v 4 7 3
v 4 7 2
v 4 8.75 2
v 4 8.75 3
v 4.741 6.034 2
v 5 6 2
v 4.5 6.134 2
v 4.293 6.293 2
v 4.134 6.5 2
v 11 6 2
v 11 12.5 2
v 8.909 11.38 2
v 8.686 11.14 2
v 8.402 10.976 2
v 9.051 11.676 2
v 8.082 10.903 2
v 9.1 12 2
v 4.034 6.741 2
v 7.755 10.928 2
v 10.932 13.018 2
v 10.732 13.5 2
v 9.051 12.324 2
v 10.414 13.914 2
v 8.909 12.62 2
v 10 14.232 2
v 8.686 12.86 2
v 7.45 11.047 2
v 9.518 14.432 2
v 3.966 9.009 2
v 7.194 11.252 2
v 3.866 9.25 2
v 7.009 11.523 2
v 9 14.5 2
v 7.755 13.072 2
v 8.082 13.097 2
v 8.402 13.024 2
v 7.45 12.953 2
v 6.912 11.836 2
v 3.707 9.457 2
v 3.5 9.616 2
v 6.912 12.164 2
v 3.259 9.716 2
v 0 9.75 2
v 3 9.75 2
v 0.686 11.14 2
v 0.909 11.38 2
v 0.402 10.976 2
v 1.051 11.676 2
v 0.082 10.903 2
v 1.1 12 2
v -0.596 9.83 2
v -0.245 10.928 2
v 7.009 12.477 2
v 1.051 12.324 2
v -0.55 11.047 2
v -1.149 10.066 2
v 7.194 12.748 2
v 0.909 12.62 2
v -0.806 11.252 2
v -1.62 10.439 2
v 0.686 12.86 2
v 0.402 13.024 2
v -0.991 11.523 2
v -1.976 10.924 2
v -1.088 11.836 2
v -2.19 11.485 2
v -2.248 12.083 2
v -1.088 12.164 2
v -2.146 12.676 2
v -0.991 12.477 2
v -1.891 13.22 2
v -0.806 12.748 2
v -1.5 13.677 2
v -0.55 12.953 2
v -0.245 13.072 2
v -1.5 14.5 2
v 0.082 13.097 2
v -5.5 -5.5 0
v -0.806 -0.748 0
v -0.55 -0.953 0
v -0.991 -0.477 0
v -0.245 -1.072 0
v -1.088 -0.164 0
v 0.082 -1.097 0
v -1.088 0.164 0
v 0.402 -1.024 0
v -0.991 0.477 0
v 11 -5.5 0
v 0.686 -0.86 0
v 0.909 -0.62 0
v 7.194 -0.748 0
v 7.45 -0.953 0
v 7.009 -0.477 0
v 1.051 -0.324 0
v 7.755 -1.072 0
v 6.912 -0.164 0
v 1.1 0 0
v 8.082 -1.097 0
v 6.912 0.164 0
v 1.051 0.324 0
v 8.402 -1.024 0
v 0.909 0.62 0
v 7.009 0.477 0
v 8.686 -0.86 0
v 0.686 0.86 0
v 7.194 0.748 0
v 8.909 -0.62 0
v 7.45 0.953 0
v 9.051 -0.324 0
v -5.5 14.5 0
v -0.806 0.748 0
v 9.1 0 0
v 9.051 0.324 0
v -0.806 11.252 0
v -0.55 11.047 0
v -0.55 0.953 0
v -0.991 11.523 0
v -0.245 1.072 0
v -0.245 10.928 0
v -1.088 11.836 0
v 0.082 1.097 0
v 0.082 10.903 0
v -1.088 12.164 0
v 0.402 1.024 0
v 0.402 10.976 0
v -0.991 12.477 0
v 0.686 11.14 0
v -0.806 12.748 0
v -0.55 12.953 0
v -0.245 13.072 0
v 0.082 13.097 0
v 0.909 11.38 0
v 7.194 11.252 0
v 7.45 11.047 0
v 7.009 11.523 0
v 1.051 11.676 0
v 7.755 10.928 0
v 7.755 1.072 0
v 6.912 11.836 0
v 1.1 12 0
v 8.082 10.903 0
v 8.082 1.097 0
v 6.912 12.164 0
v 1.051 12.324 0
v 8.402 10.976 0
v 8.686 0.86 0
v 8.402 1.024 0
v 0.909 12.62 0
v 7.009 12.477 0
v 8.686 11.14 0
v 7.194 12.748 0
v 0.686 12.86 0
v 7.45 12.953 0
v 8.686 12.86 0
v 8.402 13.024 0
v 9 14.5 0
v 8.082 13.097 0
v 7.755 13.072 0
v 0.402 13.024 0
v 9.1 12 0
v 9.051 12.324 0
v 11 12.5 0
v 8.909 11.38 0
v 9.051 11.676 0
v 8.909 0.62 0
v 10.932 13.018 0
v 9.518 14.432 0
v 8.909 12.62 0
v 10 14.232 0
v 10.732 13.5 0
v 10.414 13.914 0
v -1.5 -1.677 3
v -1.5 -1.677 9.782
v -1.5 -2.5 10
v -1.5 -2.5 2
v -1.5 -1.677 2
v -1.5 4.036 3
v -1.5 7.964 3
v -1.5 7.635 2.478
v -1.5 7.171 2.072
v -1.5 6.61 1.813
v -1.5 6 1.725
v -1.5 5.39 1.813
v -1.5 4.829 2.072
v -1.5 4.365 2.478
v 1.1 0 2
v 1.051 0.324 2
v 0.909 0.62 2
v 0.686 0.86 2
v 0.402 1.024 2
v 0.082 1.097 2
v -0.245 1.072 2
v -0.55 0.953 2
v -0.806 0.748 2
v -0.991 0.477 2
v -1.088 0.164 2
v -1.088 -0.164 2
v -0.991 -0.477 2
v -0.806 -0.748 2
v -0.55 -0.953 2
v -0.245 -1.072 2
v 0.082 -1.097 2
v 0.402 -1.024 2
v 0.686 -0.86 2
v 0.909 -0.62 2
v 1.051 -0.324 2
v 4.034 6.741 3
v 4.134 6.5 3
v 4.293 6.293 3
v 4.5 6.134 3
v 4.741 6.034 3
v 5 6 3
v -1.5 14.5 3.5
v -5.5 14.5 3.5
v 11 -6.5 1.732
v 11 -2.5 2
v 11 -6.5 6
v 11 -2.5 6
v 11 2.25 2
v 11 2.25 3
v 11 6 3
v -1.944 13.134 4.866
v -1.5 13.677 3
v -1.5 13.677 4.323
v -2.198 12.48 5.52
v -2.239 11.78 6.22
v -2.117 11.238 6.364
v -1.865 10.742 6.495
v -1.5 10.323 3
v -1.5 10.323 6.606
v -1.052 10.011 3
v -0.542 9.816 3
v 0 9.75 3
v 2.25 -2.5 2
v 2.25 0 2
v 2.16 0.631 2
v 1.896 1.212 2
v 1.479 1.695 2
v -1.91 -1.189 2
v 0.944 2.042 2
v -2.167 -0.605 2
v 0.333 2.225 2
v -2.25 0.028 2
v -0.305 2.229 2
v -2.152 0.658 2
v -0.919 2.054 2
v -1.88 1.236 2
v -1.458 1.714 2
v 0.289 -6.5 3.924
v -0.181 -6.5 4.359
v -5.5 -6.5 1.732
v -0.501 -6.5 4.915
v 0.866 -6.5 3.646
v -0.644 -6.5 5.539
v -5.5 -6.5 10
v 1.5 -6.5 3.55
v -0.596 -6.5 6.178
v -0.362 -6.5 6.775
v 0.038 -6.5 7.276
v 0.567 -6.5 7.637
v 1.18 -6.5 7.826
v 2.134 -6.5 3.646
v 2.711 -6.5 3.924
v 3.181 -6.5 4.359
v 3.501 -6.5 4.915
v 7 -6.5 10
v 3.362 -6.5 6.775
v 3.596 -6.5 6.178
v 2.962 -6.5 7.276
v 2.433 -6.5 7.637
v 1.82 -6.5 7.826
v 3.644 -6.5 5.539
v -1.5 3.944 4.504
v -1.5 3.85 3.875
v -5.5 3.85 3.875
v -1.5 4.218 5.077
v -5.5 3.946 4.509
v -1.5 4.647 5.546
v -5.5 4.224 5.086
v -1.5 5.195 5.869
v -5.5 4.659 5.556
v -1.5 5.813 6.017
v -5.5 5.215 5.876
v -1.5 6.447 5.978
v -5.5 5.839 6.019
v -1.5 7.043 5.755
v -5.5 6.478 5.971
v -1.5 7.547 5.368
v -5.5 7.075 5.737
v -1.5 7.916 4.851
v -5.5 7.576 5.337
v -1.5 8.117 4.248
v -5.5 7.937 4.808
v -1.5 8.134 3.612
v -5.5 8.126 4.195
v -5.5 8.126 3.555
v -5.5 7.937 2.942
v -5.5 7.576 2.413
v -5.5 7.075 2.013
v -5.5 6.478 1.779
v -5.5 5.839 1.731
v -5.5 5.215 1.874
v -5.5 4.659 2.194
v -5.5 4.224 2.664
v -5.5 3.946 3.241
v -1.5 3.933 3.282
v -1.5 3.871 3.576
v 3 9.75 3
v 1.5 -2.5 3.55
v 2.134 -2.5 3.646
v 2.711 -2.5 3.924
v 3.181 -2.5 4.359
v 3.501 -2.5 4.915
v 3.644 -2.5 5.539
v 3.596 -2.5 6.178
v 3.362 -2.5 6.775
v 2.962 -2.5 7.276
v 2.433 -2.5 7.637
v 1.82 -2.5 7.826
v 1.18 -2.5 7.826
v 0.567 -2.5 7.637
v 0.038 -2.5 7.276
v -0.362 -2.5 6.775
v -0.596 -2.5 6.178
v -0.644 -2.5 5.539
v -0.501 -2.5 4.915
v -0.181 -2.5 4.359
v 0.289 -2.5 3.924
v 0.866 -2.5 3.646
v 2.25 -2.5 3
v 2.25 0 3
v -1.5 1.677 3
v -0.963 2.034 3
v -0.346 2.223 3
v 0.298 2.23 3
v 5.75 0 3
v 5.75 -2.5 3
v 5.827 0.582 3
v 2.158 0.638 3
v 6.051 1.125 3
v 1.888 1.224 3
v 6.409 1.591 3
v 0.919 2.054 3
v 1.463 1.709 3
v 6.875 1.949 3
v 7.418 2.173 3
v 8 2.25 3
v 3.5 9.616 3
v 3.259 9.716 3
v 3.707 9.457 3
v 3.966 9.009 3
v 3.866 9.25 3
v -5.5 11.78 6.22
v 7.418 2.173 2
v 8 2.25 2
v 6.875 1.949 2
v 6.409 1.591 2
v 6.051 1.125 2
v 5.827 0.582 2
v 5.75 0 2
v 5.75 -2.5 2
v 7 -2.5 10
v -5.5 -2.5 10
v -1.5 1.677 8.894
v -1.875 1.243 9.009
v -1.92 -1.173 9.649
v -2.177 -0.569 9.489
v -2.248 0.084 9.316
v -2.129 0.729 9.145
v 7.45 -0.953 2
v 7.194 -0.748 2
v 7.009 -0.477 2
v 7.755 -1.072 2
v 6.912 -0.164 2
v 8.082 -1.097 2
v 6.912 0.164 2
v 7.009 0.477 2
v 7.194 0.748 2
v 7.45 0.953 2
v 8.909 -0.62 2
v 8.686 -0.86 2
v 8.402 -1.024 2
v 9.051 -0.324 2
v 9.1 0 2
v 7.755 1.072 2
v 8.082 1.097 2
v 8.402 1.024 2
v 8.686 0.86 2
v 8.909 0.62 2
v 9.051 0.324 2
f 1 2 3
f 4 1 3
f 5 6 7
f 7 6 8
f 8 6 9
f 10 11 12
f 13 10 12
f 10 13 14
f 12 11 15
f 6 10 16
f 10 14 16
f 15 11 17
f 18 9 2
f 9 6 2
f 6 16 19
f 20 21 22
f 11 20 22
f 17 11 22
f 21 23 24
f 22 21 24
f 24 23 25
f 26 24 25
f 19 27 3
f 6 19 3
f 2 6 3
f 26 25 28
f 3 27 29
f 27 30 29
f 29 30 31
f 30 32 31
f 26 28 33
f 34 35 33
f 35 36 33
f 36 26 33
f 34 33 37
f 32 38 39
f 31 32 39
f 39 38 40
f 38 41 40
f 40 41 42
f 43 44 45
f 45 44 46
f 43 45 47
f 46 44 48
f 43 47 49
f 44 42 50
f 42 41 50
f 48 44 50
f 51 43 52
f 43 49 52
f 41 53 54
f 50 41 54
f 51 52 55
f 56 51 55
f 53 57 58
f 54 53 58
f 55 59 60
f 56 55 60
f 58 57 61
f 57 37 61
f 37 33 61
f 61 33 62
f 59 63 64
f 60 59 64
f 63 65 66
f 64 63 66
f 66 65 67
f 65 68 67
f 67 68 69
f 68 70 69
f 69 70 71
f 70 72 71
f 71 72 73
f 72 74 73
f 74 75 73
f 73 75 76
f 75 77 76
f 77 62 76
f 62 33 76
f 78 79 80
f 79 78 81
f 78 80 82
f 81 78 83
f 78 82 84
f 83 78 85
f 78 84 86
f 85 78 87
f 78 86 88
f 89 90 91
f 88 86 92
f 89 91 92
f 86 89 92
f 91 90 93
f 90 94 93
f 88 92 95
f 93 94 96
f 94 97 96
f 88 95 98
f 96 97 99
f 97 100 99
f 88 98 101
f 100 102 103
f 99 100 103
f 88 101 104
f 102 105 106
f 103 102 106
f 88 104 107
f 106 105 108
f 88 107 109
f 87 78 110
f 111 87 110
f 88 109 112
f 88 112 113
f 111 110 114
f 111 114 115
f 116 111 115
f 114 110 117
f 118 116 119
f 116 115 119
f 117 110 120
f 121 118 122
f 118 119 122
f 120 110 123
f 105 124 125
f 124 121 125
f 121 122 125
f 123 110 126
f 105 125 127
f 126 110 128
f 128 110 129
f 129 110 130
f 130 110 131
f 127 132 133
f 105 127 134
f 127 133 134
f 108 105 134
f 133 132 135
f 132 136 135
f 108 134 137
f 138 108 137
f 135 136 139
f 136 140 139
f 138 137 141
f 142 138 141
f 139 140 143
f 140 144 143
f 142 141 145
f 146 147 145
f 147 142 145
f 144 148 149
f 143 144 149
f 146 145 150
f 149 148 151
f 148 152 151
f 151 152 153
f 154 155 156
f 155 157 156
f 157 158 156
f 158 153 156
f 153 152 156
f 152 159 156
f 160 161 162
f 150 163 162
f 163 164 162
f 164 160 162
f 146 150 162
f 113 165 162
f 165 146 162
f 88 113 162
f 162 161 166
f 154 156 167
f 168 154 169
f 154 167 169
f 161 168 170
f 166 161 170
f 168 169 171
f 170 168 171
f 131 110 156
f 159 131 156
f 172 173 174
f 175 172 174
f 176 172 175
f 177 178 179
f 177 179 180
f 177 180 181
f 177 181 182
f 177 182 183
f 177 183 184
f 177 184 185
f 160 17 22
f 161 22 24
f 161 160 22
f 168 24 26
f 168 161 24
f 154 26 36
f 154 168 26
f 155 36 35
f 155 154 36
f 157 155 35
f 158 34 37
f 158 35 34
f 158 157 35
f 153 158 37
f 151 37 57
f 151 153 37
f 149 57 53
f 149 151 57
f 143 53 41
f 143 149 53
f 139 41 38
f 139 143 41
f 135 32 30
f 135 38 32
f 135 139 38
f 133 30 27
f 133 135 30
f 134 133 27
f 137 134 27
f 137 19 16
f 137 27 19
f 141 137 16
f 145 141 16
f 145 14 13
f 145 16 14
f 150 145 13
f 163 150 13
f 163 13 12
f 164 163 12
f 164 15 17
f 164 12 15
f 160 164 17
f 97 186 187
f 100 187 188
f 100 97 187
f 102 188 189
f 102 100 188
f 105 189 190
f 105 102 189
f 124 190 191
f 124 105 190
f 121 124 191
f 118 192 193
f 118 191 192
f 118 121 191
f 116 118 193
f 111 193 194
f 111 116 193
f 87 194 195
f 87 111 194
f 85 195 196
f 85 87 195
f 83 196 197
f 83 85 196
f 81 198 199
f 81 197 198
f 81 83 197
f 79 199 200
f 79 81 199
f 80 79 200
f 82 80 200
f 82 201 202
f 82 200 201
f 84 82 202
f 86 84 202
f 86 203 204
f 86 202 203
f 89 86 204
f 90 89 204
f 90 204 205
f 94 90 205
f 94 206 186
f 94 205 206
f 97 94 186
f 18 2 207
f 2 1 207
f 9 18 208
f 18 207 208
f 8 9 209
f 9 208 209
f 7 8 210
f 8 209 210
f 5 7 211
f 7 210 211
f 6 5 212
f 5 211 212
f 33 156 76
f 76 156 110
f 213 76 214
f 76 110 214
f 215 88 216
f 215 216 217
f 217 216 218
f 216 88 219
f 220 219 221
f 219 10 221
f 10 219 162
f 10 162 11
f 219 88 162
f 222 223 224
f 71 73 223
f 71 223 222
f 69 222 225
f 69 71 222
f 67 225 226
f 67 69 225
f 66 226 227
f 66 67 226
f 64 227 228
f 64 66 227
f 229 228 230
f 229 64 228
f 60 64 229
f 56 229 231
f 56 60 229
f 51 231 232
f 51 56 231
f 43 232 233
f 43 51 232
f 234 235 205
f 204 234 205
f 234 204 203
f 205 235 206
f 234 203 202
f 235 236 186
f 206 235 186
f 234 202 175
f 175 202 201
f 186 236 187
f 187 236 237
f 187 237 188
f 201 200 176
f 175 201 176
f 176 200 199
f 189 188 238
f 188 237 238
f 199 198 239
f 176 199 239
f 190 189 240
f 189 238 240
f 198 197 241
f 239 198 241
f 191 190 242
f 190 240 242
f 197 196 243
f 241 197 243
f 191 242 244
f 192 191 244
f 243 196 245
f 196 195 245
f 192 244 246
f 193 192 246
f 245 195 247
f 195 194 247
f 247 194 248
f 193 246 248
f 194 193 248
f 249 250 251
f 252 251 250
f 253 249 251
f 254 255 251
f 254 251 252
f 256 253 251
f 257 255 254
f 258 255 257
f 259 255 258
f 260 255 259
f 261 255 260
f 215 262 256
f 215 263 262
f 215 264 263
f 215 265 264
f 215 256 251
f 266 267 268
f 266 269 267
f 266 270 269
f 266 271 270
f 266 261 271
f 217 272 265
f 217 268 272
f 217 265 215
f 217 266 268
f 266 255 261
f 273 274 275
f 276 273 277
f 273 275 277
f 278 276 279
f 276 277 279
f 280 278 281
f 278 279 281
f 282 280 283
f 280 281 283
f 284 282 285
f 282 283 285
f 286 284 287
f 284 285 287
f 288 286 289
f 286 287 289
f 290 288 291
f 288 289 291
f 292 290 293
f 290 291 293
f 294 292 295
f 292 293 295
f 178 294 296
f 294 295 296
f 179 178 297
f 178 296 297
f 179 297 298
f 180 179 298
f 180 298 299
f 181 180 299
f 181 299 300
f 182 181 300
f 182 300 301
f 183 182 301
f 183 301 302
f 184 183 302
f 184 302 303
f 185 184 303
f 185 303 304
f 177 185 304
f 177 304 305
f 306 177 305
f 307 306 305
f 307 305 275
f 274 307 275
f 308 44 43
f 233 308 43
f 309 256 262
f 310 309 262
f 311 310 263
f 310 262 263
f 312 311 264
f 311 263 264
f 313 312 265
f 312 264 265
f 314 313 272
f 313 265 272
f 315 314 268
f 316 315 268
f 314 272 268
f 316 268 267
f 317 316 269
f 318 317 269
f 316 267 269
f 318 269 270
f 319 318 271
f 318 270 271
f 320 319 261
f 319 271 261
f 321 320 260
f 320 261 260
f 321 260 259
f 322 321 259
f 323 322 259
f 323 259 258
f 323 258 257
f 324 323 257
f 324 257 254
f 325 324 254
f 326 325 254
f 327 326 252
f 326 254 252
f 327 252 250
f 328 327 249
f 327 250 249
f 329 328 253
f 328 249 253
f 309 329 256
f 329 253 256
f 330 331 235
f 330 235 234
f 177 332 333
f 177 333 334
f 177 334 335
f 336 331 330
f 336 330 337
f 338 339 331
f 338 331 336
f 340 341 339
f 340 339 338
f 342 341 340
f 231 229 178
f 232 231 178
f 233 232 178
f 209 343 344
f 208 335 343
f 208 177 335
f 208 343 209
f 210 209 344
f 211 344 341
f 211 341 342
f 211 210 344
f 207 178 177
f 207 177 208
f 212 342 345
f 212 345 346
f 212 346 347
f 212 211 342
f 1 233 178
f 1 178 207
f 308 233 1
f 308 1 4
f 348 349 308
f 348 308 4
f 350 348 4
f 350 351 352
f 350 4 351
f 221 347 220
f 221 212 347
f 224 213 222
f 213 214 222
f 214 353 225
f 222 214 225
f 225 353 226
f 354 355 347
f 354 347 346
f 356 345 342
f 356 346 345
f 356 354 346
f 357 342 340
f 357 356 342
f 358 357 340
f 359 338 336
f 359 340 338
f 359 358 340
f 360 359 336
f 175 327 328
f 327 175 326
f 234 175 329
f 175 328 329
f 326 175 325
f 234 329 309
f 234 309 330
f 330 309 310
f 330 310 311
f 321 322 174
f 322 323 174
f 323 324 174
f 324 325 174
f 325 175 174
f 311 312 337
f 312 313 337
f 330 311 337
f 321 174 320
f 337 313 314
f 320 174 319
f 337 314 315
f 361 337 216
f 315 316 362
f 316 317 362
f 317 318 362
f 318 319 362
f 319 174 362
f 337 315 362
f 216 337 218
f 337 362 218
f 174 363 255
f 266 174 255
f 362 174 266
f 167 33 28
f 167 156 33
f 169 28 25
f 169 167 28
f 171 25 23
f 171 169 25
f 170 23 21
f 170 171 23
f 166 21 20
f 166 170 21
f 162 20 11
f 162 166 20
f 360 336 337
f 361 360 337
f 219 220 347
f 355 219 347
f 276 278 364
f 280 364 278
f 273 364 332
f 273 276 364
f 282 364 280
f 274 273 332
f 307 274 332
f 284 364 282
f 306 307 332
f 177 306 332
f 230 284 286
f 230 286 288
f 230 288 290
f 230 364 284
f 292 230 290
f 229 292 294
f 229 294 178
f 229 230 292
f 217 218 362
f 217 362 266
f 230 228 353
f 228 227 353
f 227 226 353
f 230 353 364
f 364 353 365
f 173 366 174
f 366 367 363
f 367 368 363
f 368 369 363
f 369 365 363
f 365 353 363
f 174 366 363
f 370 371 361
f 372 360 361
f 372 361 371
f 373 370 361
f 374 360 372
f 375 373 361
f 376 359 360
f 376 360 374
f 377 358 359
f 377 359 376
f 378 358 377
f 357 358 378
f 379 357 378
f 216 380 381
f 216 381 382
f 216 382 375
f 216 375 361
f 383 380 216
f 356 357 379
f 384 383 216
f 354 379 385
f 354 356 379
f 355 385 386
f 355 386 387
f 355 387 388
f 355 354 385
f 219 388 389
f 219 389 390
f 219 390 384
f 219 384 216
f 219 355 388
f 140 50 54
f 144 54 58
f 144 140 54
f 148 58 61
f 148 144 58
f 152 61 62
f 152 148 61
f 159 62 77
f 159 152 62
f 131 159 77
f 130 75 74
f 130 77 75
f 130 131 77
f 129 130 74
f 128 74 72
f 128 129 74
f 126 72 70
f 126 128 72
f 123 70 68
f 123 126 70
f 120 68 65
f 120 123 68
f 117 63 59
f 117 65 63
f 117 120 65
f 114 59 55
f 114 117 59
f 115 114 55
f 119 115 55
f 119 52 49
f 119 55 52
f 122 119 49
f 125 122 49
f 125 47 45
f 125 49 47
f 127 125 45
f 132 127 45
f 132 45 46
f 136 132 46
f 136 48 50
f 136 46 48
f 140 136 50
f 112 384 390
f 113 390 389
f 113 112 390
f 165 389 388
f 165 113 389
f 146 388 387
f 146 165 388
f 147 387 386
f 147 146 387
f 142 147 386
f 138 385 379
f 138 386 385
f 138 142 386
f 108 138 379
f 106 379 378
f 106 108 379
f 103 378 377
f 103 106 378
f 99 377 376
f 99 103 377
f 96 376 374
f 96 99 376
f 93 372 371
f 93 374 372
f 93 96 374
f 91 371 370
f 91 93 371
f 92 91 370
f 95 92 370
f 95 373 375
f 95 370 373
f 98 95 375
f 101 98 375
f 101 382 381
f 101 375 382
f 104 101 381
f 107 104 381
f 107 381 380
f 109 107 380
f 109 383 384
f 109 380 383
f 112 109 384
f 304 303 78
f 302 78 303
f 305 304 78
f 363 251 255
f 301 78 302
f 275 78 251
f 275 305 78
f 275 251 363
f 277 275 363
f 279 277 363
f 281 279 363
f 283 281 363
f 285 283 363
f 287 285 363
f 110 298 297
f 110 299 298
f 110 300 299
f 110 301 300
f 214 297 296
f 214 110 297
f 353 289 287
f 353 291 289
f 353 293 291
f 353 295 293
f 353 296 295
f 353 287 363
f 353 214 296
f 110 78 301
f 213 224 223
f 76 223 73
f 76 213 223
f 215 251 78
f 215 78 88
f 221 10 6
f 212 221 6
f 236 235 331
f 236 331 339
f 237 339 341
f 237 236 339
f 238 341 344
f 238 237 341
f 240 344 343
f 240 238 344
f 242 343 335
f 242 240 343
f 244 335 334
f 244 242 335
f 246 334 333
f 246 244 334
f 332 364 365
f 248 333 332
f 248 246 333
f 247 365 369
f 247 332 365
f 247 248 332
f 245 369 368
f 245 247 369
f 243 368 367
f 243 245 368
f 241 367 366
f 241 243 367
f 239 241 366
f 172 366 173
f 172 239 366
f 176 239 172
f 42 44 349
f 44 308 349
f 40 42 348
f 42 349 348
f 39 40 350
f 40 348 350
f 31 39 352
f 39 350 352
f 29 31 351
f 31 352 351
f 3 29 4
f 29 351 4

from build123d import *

# Parameters (mm, degrees)
SKETCH_1_W               = 23
SKETCH_1_H               = 17
SKETCH_1_R               = 1.1
EXTRUDE_1_DEPTH          = 3
EXTRUDE_2_DEPTH          = 6
CUT_EXTRUDE_1_DEPTH      = 23.349496639
CUT_EXTRUDE_1_DEPTH_BACK = 1
SKETCH_3_R               = 2.25
CUT_EXTRUDE_2_REACH      = 24.349
SKETCH_4_W               = 4.5
SKETCH_4_H               = 17
CUT_EXTRUDE_3_DEPTH      = 2
SKETCH_6_R               = 2.15
CUT_EXTRUDE_4_DEPTH      = 4
SKETCH_7_W               = 16.5
SKETCH_7_H               = 10
EXTRUDE_3_DEPTH          = 4
SKETCH_8_R               = 2.15
CUT_EXTRUDE_5_DEPTH      = 4
CHAMFER_1_SIZE           = 1
CHAMFER_1_SIZE2          = 1.732050808
CHAMFER_2_SIZE           = 4
CUT_EXTRUDE_6_DEPTH      = 1
FILLET_1_R               = 2
CUT_EXTRUDE_7_REACH      = 21.881
FILLET_2_R               = 1
CHAMFER_3_SIZE           = 2
CHAMFER_3_SIZE2          = 2.813680863


with BuildPart() as part:
    # 草图1 → 凸台-拉伸1 (new body)
    with BuildSketch(Plane.XY):
        with Locations((4, 6)):
            Rectangle(SKETCH_1_W, SKETCH_1_H)
        Circle(SKETCH_1_R, mode=Mode.SUBTRACT)
        with Locations((8, 0)):
            Circle(SKETCH_1_R, mode=Mode.SUBTRACT)
        with Locations((0, 12)):
            Circle(SKETCH_1_R, mode=Mode.SUBTRACT)
        with Locations((8, 12)):
            Circle(SKETCH_1_R, mode=Mode.SUBTRACT)
    extrude(amount=EXTRUDE_1_DEPTH)

    # 草图2 → 凸台-拉伸2 (add)
    with BuildSketch(Plane.ZY.offset(7.5)):
        Polygon((5.5, 14.5), (10, -2.5), (5.5, -2.5), (0, -2.5), (0, 14.5), align=None)
    extrude(amount=-EXTRUDE_2_DEPTH)

    # 草图3 → 切除-拉伸1 (cut, two sides: drawn at the far end of the back side and taken through both)
    with BuildSketch(Plane.XY.offset(3).offset(-CUT_EXTRUDE_1_DEPTH_BACK)):
        with Locations(Location((0, 12, 0), (0, 0, 228.189685104))):
            Circle(SKETCH_3_R)
        with Locations((8, 12)):
            Circle(SKETCH_3_R)
        with Locations(Location((0, 0, 0), (0, 0, 131.810314896))):
            Circle(SKETCH_3_R)
        with Locations((8, 0)):
            Circle(SKETCH_3_R)
    extrude(amount=CUT_EXTRUDE_1_DEPTH + CUT_EXTRUDE_1_DEPTH_BACK, mode=Mode.SUBTRACT)

    # 草图4 → 切除-拉伸2 (cut, up to next)
    with BuildSketch(Plane.XY.offset(3), mode=Mode.PRIVATE) as cut_extrude_2_sk1:
        with Locations((13.25, 6)):
            Rectangle(SKETCH_4_W, SKETCH_4_H)
    cut_extrude_2_tool1 = extrude(cut_extrude_2_sk1.sketch, amount=-CUT_EXTRUDE_2_REACH, mode=Mode.PRIVATE) & part.part
    add(cut_extrude_2_tool1.solids().sort_by_distance((13.25, 6, 3))[0], mode=Mode.SUBTRACT)

    # 草图5 → 切除-拉伸3 (cut)
    with BuildSketch(Plane.ZY.offset(7.5)):
        Polygon((0, 14.5), (0, -2.5), (10, -2.5), (5.5, 14.5), align=None)
    extrude(amount=-CUT_EXTRUDE_3_DEPTH, mode=Mode.SUBTRACT)

    # 草图6 → 切除-拉伸4 (cut)
    with BuildSketch(Plane.ZY.offset(5.5)):
        with Locations(Location((3.875, 6, 0), (0, 0, 270))):
            Circle(SKETCH_6_R)
    extrude(amount=-CUT_EXTRUDE_4_DEPTH, mode=Mode.SUBTRACT)

    # 草图7 → 凸台-拉伸3 (add)
    with BuildSketch(Plane.XZ.offset(2.5)):
        with Locations((2.75, 5)):
            Rectangle(SKETCH_7_W, SKETCH_7_H)
    extrude(amount=EXTRUDE_3_DEPTH)

    # 草图8 → 切除-拉伸5 (cut)
    with BuildSketch(Plane.XZ.offset(6.5)):
        with Locations(Location((1.5, 5.7, 0), (0, 0, 270))):
            Circle(SKETCH_8_R)
    extrude(amount=-CUT_EXTRUDE_5_DEPTH, mode=Mode.SUBTRACT)

    # 倒角1
    chamfer_1_edges = [part.edges().sort_by_distance(p)[0] for p in [
        (2.75, -6.5, 0),
    ]]
    chamfer_1_side = [part.faces().sort_by_distance(p)[0] for p in [
        (2.692629218, 3.908206749, 0),
    ]]
    chamfer(chamfer_1_edges, length=CHAMFER_1_SIZE, length2=CHAMFER_1_SIZE2, reference=chamfer_1_side[0])

    # 倒角2
    chamfer_2_edges = [part.edges().sort_by_distance(p)[0] for p in [
        (11, -4.5, 10),
    ]]
    chamfer(chamfer_2_edges, length=CHAMFER_2_SIZE)

    # 草图9 → 切除-拉伸6 (cut)
    with BuildSketch(Plane.XY.offset(3)):
        with BuildLine():
            Line((-1.5, 13.677050983), (-1.5, 14.5))
            Line((-1.5, 14.5), (2.25, 14.5))
            Line((2.25, 14.5), (2.25, 12))
            ThreePointArc((2.25, 12), (0.918558654, 14.053959591), (-1.5, 13.677050983))
        make_face()
        with BuildLine():
            Line((5.75, 12), (5.75, 14.5))
            Line((5.75, 14.5), (11, 14.5))
            Line((11, 14.5), (11, 9.75))
            Line((11, 9.75), (8, 9.75))
            ThreePointArc((8, 9.75), (9.590990258, 13.590990258), (5.75, 12))
        make_face()
        with BuildLine():
            Line((2.25, 0), (2.25, -2.5))
            Line((2.25, -2.5), (-1.5, -2.5))
            Line((-1.5, -2.5), (-1.5, -1.677050983))
            ThreePointArc((-1.5, -1.677050983), (0.918558654, -2.053959591), (2.25, 0))
        make_face()
        with BuildLine():
            Line((5.75, 0), (5.75, -2.5))
            Line((5.75, -2.5), (11, -2.5))
            Line((11, -2.5), (11, 2.25))
            Line((11, 2.25), (8, 2.25))
            ThreePointArc((8, 2.25), (9.590990258, -1.590990258), (5.75, 0))
        make_face()
    extrude(amount=-CUT_EXTRUDE_6_DEPTH, mode=Mode.SUBTRACT)

    # 圆角1
    fillet_1_edges = [part.edges().sort_by_distance(p)[0] for p in [
        (11, 14.5, 1),
    ]]
    fillet(fillet_1_edges, radius=FILLET_1_R)

    # 草图10 → 切除-拉伸7 (cut, up to next)
    with BuildSketch(Plane.XY.offset(2), mode=Mode.PRIVATE) as cut_extrude_7_sk1:
        with BuildLine():
            Line((4, 14.5), (11, 14.5))
            Line((11, 14.5), (11, 6))
            Line((11, 6), (4, 6))
            Line((4, 6), (4, 9.75))
            Line((4, 9.75), (0, 9.75))
            ThreePointArc((0, 9.75), (1.590990258, 10.409009742), (2.25, 12))
            Line((2.25, 12), (2.25, 14.5))
            Line((2.25, 14.5), (4, 14.5))
        make_face()
    cut_extrude_7_tool1 = extrude(cut_extrude_7_sk1.sketch, amount=CUT_EXTRUDE_7_REACH, mode=Mode.PRIVATE) & part.part
    add(cut_extrude_7_tool1.solids().sort_by_distance((6.881457, 10.476255, 2))[0], mode=Mode.SUBTRACT)

    # 圆角2
    fillet_2_edges = [part.edges().sort_by_distance(p)[0] for p in [
        (4, 9.75, 2.5),
        (4, 6, 2.5),
    ]]
    fillet(fillet_2_edges, radius=FILLET_2_R)

    # 倒角3
    chamfer_3_edges = [part.edges().sort_by_distance(p)[0] for p in [
        (-3.5, 14.5, 5.5),
    ]]
    chamfer_3_side = [part.faces().sort_by_distance(p)[0] for p in [
        (0.040697674, 14.5, 1.895348837),
    ]]
    chamfer(chamfer_3_edges, length=CHAMFER_3_SIZE, length2=CHAMFER_3_SIZE2, reference=chamfer_3_side[0])


solid = part.part
